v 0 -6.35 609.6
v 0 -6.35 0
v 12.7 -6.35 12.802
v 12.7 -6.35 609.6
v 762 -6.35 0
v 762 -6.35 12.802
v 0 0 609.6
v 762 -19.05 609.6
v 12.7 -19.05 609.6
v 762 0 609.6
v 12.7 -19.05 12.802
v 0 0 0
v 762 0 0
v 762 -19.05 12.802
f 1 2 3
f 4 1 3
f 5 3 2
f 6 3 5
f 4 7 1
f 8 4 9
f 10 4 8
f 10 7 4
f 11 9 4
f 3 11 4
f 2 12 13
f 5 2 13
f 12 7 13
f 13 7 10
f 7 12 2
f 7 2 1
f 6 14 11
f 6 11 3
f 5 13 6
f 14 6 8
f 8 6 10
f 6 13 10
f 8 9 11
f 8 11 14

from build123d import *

# Parameters (mm, degrees)
F0_W     = 762
F0_H     = 609.6
F1_DEPTH = 19.05
F2_W     = 12.7
F2_H     = 12.8016
F3_DEPTH = 762.001
F4_W     = 12.7
F4_H     = 12.7
F5_DEPTH = 609.601


with BuildPart() as f1:
    # F0 (on Front) → F1 (new body)
    with BuildSketch(Plane.XZ):
        with Locations((381, 304.8)):
            Rectangle(F0_W, F0_H)
    extrude(amount=F1_DEPTH)

    # F2 (on face) → F3 (cut, through all)
    with BuildSketch(Plane.YZ.offset(762)):
        with Locations((-12.7, 6.4008)):
            Rectangle(F2_W, F2_H)
    extrude(amount=-F3_DEPTH, mode=Mode.SUBTRACT)

    # F4 (on face) → F5 (cut, through all)
    with BuildSketch(Plane.XY.offset(609.6)):
        with Locations((6.35, -12.7)):
            Rectangle(F4_W, F4_H)
    extrude(amount=-F5_DEPTH, mode=Mode.SUBTRACT)


solid = f1.part
